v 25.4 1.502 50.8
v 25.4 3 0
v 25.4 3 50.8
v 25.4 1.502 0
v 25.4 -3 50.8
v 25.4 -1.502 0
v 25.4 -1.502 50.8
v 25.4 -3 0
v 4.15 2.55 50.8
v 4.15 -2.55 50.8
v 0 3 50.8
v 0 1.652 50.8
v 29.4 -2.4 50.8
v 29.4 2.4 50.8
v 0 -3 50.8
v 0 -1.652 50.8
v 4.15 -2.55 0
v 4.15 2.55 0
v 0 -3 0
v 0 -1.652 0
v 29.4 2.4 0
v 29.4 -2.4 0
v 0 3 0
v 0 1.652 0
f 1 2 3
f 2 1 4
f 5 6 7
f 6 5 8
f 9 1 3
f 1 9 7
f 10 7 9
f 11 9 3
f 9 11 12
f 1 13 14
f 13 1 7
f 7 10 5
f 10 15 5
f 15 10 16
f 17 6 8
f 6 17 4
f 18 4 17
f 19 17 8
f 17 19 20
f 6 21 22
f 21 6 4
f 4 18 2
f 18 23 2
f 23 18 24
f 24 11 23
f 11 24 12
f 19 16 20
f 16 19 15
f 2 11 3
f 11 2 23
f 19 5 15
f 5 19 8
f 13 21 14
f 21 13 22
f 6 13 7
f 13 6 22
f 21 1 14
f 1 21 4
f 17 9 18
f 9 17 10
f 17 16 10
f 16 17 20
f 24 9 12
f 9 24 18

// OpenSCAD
// file: ../lib/pieces.scad
// pieces.scad — the core piece library (Phase 1).
// Requires grid.scad and connectors.scad to be included first.
//
// Grid convention: floors fill grid cells; walls run along grid lines,
// centered on them. Chains of gendered (tab) pieces alternate
// male-into-female; magnet/dowel/none pieces are genderless.

// Wall-end dovetail, sized to fit inside the wall thickness (absolute).
WALL_TAB_NECK  = 3;
WALL_TAB_HEAD  = 4.8;
WALL_TAB_DEPTH = 4;

// Structural thicknesses auto-grow when a magnet must fit in the edge.
function floor_t() = (CONNECTOR == "magnet")
    ? max(scaled(FLOOR_THICKNESS), magnet_d() + 2.4)
    : scaled(FLOOR_THICKNESS);
function wall_t() = (CONNECTOR == "magnet")
    ? max(scaled(WALL_THICKNESS), magnet_d() + 2.4)
    : scaled(WALL_THICKNESS);
function wall_h() = grid(WALL_HEIGHT_UNITS);

// ---------------------------------------------------------------------
// Floor tile: w x l grid cells, one connector centered per grid-square
// edge segment. Tab gender: male on +X and +Y edges, female on -X and
// -Y, so identically-oriented tiles tessellate in both directions.
module floor_tile(w = 1, l = 1) {
    t = floor_t();
    difference() {
        union() {
            cube([grid(w), grid(l), t]);
            if (CONNECTOR == "tab") {
                for (j = [0 : l - 1])
                    translate([grid(w), grid(j + 0.5), 0]) tab_male(t);
                for (i = [0 : w - 1])
                    translate([grid(i + 0.5), grid(l), 0])
                        rotate([0, 0, 90]) tab_male(t);
            }
        }
        if (CONNECTOR == "tab") {
            for (j = [0 : l - 1])
                translate([0, grid(j + 0.5), 0]) tab_female(t);
            for (i = [0 : w - 1])
                translate([grid(i + 0.5), 0, 0])
                    rotate([0, 0, 90]) tab_female(t);
        }
        if (CONNECTOR == "magnet" || CONNECTOR == "dowel") {
            for (j = [0 : l - 1]) {
                translate([0, grid(j + 0.5), 0]) edge_fastener(t / 2);
                translate([grid(w), grid(j + 0.5), 0])
                    mirror([1, 0, 0]) edge_fastener(t / 2);
            }
            for (i = [0 : w - 1]) {
                translate([grid(i + 0.5), 0, 0])
                    rotate([0, 0, 90]) edge_fastener(t / 2);
                translate([grid(i + 0.5), grid(l), 0])
                    mirror([0, 1, 0]) rotate([0, 0, 90])
                        edge_fastener(t / 2);
            }
        }
    }
}

// Magnet pocket or dowel hole, per the active CONNECTOR.
module edge_fastener(z) {
    if (CONNECTOR == "magnet") magnet_pocket(z);
    if (CONNECTOR == "dowel")  dowel_hole(z);
}

// ---------------------------------------------------------------------
// Straight wall: `units` grid squares long, centered on the grid line
// (y = 0). Tab gender: male at +X end, female at -X end; the tab runs
// the full height as a vertical sliding dovetail. Magnet/dowel: two
// fasteners per end face.
module wall_straight(units = 1) {
    h  = wall_h();
    wt = wall_t();
    difference() {
        union() {
            translate([0, -wt / 2, 0]) cube([grid(units), wt, h]);
            if (CONNECTOR == "tab")
                translate([grid(units), 0, 0])
                    tab_male(h, WALL_TAB_NECK, WALL_TAB_HEAD,
                             WALL_TAB_DEPTH);
        }
        if (CONNECTOR == "tab")
            tab_female(h, fit_clearance(), WALL_TAB_NECK, WALL_TAB_HEAD,
                       WALL_TAB_DEPTH);
        for (z = wall_fastener_heights()) {
            edge_fastener(z);
            translate([grid(units), 0, 0]) mirror([1, 0, 0])
                edge_fastener(z);
        }
    }
}

function wall_fastener_heights() =
    (CONNECTOR == "magnet" || CONNECTOR == "dowel")
        ? [grid(0.5), wall_h() - grid(0.5)] : [];

// ---------------------------------------------------------------------
// 90-degree corner: one arm along +X, one along +Y, each one grid
// square long, meeting at the grid-line crossing (origin). Tab gender:
// male at the +X arm end, female at the +Y arm end (opening outward),
// so a chain enters one arm and exits the other. Tab chains are
// chiral: set mirrored = true for the opposite-handed corner.
module wall_corner(mirrored = false) {
    h  = wall_h();
    wt = wall_t();
    mirror([mirrored ? 1 : 0, 0, 0])
        difference() {
            union() {
                translate([-wt / 2, -wt / 2, 0])
                    cube([grid(1) + wt / 2, wt, h]);
                translate([-wt / 2, -wt / 2, 0])
                    cube([wt, grid(1) + wt / 2, h]);
                if (CONNECTOR == "tab")
                    translate([grid(1), 0, 0])
                        tab_male(h, WALL_TAB_NECK, WALL_TAB_HEAD,
                                 WALL_TAB_DEPTH);
            }
            if (CONNECTOR == "tab")
                translate([0, grid(1), 0]) rotate([0, 0, -90])
                    tab_female(h, fit_clearance(), WALL_TAB_NECK,
                               WALL_TAB_HEAD, WALL_TAB_DEPTH);
            for (z = wall_fastener_heights()) {
                translate([grid(1), 0, 0]) mirror([1, 0, 0])
                    edge_fastener(z);
                translate([0, grid(1), 0]) mirror([0, 1, 0])
                    rotate([0, 0, 90]) edge_fastener(z);
            }
        }
}
// file: ../lib/connectors.scad
// connectors.scad — shared connector geometry.
// Requires grid.scad to be included first.
//
// Convention: a connector lives on an edge face lying in the YZ plane
// at x = 0, centered on y = 0, with the piece's material on the -X
// side for male parts and the +X side for female parts. Pieces
// translate/rotate these modules into position.
//
// All fit-critical dimensions here are ABSOLUTE (see grid.scad).

// Connector type used by all pieces: "tab" | "magnet" | "dowel" | "none".
// Tab & slot is gendered (a piece has male and female edges); magnet,
// dowel, and none are genderless, so tiles can be rotated freely.
CONNECTOR = "tab";

// Tab & slot (puzzle-style dovetail, full piece thickness). Defaults
// suit flat tiles; walls pass smaller dims that fit inside their
// thickness (see pieces.scad).
TAB_NECK  = 6;    // width at the edge face
TAB_HEAD  = 10;   // width at the tip
TAB_DEPTH = 6;    // how far the tab projects

// Dowel pin (1.75mm filament offcuts make free pins).
DOWEL_D     = 1.85;
DOWEL_DEPTH = 6;

// Magnet pocket. Named size "DxH" in mm.
MAGNET = "5x2";
function magnet_d(m = MAGNET) =
    m == "3x2" ? 3 : m == "6x2" ? 6 : m == "8x3" ? 8 : 5;
function magnet_h(m = MAGNET) =
    m == "8x3" ? 3 : 2;

// Dovetail profile, projecting toward +X. grow > 0 loosens the female.
module tab_profile(grow = 0, neck = TAB_NECK, head = TAB_HEAD,
                   depth = TAB_DEPTH) {
    polygon([
        [-EPS,         -(neck / 2 + grow)],
        [depth + grow, -(head / 2 + grow)],
        [depth + grow,   head / 2 + grow],
        [-EPS,           neck / 2 + grow]
    ]);
}

// Male tab: union onto a piece whose edge face is at x = 0, material
// on -X. The tab projects +X into the neighboring piece's slot.
module tab_male(thickness, neck = TAB_NECK, head = TAB_HEAD,
                depth = TAB_DEPTH) {
    linear_extrude(height = thickness)
        tab_profile(0, neck, head, depth);
}

// Female slot: subtract from a piece whose edge face is at x = 0,
// material on +X. The cut extends +X into the material, opening at the
// edge face so the mating tab enters from -X.
module tab_female(thickness, clearance = fit_clearance(),
                  neck = TAB_NECK, head = TAB_HEAD, depth = TAB_DEPTH) {
    translate([0, 0, -EPS])
        linear_extrude(height = thickness + 2 * EPS)
            tab_profile(clearance, neck, head, depth);
}

// Cylindrical pocket bored into an edge face at x = 0, material on +X,
// axis along +X, centered at height z.
module edge_pocket(d, depth, z) {
    translate([-EPS, 0, z])
        rotate([0, 90, 0])
            cylinder(h = depth + EPS, d = d);
}

// Magnet pocket (female on both mating pieces). Slight extra depth so
// the magnet seats flush after glue.
module magnet_pocket(z, m = MAGNET, clearance = fit_clearance()) {
    edge_pocket(magnet_d(m) + clearance, magnet_h(m) + 0.1, z);
}

// Dowel hole (female on both mating pieces).
module dowel_hole(z, clearance = fit_clearance()) {
    edge_pocket(DOWEL_D + clearance, DOWEL_DEPTH, z);
}
// file: ../lib/grid.scad
// grid.scad — core grid, scale, and tolerance foundation.
// Every piece in the system includes this file.
//
// Two classes of dimension, never mixed:
//   scaled()  — aesthetic sizes; follow SCALE so kits can be resized.
//   absolute  — fit-critical sizes (clearances, magnet pockets, pin
//               holes); constant regardless of SCALE.

// One tabletop grid square. 25.4mm (1 inch) keeps pieces in register
// with battlemats and standard 2-inch tile systems. Change once to
// retarget the whole library (e.g. 32 for a 32mm module standard).
GRID_UNIT = 25.4;

// Aesthetic scale multiplier (1.0 = 28mm heroic terrain).
SCALE = 1.0;

// Default structural sizes (scaled, mm at SCALE = 1.0).
FLOOR_THICKNESS   = 4;
WALL_THICKNESS    = 6;
WALL_HEIGHT_UNITS = 2;   // wall height in grid units

// Fit preset: "tight" | "normal" | "loose". Absolute mm — never scaled.
FIT = "normal";

function fit_clearance(fit = FIT) =
    fit == "tight" ? 0.10 :
    fit == "loose" ? 0.25 :
                     0.15;

// Helpers.
function scaled(x) = x * SCALE;
function grid(n)   = n * GRID_UNIT * SCALE;

// Boolean-overlap epsilon for clean CSG.
EPS = 0.01;

// Curve quality.
$fa = 4;
$fs = 0.4;
// main file
// wall_straight.scad — straight wall, WALL_UNITS grid squares long.
include <../lib/grid.scad>
include <../lib/connectors.scad>
include <../lib/pieces.scad>

WALL_UNITS = 1;

wall_straight(WALL_UNITS);
